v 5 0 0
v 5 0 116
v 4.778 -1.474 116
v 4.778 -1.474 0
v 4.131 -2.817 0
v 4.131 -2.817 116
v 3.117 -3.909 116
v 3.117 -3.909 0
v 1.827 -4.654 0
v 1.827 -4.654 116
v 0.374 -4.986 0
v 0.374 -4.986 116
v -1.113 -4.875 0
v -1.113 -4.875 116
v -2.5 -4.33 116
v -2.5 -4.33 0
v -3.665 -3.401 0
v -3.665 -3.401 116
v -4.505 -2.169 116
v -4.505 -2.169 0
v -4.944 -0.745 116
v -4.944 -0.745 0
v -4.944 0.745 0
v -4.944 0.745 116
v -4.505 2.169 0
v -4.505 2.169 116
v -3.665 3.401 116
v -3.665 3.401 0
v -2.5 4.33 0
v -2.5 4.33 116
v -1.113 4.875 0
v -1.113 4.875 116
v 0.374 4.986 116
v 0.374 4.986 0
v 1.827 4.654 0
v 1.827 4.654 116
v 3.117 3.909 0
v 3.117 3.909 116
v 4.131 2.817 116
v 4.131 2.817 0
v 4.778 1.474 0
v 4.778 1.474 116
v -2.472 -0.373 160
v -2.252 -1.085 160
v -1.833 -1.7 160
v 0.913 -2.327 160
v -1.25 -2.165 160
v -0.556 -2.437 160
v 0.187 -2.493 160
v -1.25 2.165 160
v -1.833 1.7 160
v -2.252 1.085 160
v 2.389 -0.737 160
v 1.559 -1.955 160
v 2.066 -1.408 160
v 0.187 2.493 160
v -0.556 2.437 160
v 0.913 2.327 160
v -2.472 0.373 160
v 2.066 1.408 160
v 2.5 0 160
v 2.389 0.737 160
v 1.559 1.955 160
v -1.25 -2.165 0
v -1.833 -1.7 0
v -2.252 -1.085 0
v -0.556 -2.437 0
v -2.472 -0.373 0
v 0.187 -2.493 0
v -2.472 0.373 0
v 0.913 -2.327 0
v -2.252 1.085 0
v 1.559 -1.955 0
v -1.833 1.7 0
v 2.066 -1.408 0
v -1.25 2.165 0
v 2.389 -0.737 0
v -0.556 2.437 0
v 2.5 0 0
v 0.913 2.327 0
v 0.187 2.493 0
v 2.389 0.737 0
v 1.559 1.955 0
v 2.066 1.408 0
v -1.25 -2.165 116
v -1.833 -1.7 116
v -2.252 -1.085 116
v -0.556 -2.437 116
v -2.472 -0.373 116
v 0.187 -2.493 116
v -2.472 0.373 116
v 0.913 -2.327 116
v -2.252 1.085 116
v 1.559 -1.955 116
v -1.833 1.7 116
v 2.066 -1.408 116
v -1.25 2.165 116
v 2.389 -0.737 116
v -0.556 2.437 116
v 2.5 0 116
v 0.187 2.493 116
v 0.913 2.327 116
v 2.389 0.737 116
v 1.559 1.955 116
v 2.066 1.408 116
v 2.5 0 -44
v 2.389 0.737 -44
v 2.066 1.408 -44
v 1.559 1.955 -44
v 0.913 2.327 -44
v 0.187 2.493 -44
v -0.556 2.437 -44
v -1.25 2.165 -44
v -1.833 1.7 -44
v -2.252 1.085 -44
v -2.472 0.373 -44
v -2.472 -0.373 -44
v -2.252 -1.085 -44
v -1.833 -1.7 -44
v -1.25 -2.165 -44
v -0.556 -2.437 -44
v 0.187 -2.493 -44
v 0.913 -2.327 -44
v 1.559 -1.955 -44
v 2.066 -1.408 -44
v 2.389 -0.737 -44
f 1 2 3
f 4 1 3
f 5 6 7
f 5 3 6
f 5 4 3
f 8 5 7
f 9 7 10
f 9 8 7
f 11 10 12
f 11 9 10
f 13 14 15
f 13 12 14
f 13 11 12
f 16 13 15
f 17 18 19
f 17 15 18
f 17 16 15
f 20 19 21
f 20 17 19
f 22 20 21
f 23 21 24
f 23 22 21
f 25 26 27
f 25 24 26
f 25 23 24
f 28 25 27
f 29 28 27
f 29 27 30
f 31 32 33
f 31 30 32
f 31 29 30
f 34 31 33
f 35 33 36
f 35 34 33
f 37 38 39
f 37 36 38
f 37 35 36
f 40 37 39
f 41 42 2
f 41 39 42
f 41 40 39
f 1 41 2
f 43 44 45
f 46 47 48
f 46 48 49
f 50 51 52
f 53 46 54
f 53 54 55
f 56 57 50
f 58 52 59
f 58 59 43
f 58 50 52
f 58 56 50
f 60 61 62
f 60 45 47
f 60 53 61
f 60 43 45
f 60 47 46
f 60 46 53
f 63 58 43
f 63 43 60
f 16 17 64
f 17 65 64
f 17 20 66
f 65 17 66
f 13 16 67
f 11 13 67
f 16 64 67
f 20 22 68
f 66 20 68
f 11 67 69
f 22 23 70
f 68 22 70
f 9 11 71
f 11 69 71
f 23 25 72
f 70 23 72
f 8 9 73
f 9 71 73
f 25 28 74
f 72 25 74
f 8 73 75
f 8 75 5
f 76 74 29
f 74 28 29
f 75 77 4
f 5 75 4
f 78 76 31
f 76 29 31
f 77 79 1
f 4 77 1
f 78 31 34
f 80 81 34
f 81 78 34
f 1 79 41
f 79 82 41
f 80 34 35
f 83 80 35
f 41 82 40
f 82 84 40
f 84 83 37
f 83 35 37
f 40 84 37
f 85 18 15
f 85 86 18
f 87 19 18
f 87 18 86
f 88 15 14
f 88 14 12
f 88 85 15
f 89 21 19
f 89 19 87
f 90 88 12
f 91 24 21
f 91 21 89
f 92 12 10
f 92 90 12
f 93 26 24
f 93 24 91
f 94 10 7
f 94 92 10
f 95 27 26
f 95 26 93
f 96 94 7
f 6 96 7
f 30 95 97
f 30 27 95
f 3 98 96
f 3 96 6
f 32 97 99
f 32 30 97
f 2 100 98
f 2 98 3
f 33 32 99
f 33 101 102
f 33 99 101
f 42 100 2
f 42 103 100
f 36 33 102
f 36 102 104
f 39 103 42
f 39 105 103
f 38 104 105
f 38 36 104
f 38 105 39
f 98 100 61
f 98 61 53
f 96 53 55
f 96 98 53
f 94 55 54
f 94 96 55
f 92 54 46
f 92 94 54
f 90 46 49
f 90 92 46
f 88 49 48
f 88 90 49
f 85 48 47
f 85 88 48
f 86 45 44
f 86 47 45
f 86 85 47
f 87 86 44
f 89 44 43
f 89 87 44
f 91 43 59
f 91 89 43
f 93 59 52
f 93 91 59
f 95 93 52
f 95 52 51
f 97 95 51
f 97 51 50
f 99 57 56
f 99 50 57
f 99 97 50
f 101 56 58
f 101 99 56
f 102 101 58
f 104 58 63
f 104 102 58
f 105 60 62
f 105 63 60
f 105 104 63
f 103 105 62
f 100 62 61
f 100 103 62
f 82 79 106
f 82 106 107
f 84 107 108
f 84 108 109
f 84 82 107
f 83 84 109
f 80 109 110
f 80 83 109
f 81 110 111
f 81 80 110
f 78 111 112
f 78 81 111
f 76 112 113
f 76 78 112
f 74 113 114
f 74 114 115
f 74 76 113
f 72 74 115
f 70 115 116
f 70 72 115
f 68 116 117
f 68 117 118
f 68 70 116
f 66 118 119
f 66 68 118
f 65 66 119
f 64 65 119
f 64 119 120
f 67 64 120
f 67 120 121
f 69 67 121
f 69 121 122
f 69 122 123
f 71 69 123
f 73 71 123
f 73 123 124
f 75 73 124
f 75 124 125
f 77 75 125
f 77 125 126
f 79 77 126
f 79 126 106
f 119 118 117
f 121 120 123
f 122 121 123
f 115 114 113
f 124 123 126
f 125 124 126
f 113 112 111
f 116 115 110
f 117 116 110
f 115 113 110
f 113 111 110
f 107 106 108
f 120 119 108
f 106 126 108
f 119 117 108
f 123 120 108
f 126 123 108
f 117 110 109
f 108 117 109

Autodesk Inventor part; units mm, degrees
ref_plane "YZ Plane" through (0, 0, 0) normal (1, 0, 0) x (0, 1, 0)
ref_plane "XZ Plane" through (0, 0, 0) normal (0, 1, 0) x (-1, 0, 0)
ref_plane "XY Plane" through (0, 0, 0) normal (0, 0, 1) x (1, 0, 0)
sketch "Sketch1" plane through (0, 0, 0) normal (0, 0, 1) x (1, 0, 0)
  circle A0 centre (0, 0) radius 5
  circle A1 centre (0, 0) radius 2.5
  dimension "d0" = 10
  dimension "d1" = 5
extrude "Extrusion1" add sketch "Sketch1" along normal blind 116 contours A0 | A1
extrude "Extrusion2" add sketch "Sketch1" along normal blind 44 from surface at 116 contours A1
extrude "Extrusion3" add sketch "Sketch1" against normal blind 44 contours A1
properties part number "Main Shaft"
